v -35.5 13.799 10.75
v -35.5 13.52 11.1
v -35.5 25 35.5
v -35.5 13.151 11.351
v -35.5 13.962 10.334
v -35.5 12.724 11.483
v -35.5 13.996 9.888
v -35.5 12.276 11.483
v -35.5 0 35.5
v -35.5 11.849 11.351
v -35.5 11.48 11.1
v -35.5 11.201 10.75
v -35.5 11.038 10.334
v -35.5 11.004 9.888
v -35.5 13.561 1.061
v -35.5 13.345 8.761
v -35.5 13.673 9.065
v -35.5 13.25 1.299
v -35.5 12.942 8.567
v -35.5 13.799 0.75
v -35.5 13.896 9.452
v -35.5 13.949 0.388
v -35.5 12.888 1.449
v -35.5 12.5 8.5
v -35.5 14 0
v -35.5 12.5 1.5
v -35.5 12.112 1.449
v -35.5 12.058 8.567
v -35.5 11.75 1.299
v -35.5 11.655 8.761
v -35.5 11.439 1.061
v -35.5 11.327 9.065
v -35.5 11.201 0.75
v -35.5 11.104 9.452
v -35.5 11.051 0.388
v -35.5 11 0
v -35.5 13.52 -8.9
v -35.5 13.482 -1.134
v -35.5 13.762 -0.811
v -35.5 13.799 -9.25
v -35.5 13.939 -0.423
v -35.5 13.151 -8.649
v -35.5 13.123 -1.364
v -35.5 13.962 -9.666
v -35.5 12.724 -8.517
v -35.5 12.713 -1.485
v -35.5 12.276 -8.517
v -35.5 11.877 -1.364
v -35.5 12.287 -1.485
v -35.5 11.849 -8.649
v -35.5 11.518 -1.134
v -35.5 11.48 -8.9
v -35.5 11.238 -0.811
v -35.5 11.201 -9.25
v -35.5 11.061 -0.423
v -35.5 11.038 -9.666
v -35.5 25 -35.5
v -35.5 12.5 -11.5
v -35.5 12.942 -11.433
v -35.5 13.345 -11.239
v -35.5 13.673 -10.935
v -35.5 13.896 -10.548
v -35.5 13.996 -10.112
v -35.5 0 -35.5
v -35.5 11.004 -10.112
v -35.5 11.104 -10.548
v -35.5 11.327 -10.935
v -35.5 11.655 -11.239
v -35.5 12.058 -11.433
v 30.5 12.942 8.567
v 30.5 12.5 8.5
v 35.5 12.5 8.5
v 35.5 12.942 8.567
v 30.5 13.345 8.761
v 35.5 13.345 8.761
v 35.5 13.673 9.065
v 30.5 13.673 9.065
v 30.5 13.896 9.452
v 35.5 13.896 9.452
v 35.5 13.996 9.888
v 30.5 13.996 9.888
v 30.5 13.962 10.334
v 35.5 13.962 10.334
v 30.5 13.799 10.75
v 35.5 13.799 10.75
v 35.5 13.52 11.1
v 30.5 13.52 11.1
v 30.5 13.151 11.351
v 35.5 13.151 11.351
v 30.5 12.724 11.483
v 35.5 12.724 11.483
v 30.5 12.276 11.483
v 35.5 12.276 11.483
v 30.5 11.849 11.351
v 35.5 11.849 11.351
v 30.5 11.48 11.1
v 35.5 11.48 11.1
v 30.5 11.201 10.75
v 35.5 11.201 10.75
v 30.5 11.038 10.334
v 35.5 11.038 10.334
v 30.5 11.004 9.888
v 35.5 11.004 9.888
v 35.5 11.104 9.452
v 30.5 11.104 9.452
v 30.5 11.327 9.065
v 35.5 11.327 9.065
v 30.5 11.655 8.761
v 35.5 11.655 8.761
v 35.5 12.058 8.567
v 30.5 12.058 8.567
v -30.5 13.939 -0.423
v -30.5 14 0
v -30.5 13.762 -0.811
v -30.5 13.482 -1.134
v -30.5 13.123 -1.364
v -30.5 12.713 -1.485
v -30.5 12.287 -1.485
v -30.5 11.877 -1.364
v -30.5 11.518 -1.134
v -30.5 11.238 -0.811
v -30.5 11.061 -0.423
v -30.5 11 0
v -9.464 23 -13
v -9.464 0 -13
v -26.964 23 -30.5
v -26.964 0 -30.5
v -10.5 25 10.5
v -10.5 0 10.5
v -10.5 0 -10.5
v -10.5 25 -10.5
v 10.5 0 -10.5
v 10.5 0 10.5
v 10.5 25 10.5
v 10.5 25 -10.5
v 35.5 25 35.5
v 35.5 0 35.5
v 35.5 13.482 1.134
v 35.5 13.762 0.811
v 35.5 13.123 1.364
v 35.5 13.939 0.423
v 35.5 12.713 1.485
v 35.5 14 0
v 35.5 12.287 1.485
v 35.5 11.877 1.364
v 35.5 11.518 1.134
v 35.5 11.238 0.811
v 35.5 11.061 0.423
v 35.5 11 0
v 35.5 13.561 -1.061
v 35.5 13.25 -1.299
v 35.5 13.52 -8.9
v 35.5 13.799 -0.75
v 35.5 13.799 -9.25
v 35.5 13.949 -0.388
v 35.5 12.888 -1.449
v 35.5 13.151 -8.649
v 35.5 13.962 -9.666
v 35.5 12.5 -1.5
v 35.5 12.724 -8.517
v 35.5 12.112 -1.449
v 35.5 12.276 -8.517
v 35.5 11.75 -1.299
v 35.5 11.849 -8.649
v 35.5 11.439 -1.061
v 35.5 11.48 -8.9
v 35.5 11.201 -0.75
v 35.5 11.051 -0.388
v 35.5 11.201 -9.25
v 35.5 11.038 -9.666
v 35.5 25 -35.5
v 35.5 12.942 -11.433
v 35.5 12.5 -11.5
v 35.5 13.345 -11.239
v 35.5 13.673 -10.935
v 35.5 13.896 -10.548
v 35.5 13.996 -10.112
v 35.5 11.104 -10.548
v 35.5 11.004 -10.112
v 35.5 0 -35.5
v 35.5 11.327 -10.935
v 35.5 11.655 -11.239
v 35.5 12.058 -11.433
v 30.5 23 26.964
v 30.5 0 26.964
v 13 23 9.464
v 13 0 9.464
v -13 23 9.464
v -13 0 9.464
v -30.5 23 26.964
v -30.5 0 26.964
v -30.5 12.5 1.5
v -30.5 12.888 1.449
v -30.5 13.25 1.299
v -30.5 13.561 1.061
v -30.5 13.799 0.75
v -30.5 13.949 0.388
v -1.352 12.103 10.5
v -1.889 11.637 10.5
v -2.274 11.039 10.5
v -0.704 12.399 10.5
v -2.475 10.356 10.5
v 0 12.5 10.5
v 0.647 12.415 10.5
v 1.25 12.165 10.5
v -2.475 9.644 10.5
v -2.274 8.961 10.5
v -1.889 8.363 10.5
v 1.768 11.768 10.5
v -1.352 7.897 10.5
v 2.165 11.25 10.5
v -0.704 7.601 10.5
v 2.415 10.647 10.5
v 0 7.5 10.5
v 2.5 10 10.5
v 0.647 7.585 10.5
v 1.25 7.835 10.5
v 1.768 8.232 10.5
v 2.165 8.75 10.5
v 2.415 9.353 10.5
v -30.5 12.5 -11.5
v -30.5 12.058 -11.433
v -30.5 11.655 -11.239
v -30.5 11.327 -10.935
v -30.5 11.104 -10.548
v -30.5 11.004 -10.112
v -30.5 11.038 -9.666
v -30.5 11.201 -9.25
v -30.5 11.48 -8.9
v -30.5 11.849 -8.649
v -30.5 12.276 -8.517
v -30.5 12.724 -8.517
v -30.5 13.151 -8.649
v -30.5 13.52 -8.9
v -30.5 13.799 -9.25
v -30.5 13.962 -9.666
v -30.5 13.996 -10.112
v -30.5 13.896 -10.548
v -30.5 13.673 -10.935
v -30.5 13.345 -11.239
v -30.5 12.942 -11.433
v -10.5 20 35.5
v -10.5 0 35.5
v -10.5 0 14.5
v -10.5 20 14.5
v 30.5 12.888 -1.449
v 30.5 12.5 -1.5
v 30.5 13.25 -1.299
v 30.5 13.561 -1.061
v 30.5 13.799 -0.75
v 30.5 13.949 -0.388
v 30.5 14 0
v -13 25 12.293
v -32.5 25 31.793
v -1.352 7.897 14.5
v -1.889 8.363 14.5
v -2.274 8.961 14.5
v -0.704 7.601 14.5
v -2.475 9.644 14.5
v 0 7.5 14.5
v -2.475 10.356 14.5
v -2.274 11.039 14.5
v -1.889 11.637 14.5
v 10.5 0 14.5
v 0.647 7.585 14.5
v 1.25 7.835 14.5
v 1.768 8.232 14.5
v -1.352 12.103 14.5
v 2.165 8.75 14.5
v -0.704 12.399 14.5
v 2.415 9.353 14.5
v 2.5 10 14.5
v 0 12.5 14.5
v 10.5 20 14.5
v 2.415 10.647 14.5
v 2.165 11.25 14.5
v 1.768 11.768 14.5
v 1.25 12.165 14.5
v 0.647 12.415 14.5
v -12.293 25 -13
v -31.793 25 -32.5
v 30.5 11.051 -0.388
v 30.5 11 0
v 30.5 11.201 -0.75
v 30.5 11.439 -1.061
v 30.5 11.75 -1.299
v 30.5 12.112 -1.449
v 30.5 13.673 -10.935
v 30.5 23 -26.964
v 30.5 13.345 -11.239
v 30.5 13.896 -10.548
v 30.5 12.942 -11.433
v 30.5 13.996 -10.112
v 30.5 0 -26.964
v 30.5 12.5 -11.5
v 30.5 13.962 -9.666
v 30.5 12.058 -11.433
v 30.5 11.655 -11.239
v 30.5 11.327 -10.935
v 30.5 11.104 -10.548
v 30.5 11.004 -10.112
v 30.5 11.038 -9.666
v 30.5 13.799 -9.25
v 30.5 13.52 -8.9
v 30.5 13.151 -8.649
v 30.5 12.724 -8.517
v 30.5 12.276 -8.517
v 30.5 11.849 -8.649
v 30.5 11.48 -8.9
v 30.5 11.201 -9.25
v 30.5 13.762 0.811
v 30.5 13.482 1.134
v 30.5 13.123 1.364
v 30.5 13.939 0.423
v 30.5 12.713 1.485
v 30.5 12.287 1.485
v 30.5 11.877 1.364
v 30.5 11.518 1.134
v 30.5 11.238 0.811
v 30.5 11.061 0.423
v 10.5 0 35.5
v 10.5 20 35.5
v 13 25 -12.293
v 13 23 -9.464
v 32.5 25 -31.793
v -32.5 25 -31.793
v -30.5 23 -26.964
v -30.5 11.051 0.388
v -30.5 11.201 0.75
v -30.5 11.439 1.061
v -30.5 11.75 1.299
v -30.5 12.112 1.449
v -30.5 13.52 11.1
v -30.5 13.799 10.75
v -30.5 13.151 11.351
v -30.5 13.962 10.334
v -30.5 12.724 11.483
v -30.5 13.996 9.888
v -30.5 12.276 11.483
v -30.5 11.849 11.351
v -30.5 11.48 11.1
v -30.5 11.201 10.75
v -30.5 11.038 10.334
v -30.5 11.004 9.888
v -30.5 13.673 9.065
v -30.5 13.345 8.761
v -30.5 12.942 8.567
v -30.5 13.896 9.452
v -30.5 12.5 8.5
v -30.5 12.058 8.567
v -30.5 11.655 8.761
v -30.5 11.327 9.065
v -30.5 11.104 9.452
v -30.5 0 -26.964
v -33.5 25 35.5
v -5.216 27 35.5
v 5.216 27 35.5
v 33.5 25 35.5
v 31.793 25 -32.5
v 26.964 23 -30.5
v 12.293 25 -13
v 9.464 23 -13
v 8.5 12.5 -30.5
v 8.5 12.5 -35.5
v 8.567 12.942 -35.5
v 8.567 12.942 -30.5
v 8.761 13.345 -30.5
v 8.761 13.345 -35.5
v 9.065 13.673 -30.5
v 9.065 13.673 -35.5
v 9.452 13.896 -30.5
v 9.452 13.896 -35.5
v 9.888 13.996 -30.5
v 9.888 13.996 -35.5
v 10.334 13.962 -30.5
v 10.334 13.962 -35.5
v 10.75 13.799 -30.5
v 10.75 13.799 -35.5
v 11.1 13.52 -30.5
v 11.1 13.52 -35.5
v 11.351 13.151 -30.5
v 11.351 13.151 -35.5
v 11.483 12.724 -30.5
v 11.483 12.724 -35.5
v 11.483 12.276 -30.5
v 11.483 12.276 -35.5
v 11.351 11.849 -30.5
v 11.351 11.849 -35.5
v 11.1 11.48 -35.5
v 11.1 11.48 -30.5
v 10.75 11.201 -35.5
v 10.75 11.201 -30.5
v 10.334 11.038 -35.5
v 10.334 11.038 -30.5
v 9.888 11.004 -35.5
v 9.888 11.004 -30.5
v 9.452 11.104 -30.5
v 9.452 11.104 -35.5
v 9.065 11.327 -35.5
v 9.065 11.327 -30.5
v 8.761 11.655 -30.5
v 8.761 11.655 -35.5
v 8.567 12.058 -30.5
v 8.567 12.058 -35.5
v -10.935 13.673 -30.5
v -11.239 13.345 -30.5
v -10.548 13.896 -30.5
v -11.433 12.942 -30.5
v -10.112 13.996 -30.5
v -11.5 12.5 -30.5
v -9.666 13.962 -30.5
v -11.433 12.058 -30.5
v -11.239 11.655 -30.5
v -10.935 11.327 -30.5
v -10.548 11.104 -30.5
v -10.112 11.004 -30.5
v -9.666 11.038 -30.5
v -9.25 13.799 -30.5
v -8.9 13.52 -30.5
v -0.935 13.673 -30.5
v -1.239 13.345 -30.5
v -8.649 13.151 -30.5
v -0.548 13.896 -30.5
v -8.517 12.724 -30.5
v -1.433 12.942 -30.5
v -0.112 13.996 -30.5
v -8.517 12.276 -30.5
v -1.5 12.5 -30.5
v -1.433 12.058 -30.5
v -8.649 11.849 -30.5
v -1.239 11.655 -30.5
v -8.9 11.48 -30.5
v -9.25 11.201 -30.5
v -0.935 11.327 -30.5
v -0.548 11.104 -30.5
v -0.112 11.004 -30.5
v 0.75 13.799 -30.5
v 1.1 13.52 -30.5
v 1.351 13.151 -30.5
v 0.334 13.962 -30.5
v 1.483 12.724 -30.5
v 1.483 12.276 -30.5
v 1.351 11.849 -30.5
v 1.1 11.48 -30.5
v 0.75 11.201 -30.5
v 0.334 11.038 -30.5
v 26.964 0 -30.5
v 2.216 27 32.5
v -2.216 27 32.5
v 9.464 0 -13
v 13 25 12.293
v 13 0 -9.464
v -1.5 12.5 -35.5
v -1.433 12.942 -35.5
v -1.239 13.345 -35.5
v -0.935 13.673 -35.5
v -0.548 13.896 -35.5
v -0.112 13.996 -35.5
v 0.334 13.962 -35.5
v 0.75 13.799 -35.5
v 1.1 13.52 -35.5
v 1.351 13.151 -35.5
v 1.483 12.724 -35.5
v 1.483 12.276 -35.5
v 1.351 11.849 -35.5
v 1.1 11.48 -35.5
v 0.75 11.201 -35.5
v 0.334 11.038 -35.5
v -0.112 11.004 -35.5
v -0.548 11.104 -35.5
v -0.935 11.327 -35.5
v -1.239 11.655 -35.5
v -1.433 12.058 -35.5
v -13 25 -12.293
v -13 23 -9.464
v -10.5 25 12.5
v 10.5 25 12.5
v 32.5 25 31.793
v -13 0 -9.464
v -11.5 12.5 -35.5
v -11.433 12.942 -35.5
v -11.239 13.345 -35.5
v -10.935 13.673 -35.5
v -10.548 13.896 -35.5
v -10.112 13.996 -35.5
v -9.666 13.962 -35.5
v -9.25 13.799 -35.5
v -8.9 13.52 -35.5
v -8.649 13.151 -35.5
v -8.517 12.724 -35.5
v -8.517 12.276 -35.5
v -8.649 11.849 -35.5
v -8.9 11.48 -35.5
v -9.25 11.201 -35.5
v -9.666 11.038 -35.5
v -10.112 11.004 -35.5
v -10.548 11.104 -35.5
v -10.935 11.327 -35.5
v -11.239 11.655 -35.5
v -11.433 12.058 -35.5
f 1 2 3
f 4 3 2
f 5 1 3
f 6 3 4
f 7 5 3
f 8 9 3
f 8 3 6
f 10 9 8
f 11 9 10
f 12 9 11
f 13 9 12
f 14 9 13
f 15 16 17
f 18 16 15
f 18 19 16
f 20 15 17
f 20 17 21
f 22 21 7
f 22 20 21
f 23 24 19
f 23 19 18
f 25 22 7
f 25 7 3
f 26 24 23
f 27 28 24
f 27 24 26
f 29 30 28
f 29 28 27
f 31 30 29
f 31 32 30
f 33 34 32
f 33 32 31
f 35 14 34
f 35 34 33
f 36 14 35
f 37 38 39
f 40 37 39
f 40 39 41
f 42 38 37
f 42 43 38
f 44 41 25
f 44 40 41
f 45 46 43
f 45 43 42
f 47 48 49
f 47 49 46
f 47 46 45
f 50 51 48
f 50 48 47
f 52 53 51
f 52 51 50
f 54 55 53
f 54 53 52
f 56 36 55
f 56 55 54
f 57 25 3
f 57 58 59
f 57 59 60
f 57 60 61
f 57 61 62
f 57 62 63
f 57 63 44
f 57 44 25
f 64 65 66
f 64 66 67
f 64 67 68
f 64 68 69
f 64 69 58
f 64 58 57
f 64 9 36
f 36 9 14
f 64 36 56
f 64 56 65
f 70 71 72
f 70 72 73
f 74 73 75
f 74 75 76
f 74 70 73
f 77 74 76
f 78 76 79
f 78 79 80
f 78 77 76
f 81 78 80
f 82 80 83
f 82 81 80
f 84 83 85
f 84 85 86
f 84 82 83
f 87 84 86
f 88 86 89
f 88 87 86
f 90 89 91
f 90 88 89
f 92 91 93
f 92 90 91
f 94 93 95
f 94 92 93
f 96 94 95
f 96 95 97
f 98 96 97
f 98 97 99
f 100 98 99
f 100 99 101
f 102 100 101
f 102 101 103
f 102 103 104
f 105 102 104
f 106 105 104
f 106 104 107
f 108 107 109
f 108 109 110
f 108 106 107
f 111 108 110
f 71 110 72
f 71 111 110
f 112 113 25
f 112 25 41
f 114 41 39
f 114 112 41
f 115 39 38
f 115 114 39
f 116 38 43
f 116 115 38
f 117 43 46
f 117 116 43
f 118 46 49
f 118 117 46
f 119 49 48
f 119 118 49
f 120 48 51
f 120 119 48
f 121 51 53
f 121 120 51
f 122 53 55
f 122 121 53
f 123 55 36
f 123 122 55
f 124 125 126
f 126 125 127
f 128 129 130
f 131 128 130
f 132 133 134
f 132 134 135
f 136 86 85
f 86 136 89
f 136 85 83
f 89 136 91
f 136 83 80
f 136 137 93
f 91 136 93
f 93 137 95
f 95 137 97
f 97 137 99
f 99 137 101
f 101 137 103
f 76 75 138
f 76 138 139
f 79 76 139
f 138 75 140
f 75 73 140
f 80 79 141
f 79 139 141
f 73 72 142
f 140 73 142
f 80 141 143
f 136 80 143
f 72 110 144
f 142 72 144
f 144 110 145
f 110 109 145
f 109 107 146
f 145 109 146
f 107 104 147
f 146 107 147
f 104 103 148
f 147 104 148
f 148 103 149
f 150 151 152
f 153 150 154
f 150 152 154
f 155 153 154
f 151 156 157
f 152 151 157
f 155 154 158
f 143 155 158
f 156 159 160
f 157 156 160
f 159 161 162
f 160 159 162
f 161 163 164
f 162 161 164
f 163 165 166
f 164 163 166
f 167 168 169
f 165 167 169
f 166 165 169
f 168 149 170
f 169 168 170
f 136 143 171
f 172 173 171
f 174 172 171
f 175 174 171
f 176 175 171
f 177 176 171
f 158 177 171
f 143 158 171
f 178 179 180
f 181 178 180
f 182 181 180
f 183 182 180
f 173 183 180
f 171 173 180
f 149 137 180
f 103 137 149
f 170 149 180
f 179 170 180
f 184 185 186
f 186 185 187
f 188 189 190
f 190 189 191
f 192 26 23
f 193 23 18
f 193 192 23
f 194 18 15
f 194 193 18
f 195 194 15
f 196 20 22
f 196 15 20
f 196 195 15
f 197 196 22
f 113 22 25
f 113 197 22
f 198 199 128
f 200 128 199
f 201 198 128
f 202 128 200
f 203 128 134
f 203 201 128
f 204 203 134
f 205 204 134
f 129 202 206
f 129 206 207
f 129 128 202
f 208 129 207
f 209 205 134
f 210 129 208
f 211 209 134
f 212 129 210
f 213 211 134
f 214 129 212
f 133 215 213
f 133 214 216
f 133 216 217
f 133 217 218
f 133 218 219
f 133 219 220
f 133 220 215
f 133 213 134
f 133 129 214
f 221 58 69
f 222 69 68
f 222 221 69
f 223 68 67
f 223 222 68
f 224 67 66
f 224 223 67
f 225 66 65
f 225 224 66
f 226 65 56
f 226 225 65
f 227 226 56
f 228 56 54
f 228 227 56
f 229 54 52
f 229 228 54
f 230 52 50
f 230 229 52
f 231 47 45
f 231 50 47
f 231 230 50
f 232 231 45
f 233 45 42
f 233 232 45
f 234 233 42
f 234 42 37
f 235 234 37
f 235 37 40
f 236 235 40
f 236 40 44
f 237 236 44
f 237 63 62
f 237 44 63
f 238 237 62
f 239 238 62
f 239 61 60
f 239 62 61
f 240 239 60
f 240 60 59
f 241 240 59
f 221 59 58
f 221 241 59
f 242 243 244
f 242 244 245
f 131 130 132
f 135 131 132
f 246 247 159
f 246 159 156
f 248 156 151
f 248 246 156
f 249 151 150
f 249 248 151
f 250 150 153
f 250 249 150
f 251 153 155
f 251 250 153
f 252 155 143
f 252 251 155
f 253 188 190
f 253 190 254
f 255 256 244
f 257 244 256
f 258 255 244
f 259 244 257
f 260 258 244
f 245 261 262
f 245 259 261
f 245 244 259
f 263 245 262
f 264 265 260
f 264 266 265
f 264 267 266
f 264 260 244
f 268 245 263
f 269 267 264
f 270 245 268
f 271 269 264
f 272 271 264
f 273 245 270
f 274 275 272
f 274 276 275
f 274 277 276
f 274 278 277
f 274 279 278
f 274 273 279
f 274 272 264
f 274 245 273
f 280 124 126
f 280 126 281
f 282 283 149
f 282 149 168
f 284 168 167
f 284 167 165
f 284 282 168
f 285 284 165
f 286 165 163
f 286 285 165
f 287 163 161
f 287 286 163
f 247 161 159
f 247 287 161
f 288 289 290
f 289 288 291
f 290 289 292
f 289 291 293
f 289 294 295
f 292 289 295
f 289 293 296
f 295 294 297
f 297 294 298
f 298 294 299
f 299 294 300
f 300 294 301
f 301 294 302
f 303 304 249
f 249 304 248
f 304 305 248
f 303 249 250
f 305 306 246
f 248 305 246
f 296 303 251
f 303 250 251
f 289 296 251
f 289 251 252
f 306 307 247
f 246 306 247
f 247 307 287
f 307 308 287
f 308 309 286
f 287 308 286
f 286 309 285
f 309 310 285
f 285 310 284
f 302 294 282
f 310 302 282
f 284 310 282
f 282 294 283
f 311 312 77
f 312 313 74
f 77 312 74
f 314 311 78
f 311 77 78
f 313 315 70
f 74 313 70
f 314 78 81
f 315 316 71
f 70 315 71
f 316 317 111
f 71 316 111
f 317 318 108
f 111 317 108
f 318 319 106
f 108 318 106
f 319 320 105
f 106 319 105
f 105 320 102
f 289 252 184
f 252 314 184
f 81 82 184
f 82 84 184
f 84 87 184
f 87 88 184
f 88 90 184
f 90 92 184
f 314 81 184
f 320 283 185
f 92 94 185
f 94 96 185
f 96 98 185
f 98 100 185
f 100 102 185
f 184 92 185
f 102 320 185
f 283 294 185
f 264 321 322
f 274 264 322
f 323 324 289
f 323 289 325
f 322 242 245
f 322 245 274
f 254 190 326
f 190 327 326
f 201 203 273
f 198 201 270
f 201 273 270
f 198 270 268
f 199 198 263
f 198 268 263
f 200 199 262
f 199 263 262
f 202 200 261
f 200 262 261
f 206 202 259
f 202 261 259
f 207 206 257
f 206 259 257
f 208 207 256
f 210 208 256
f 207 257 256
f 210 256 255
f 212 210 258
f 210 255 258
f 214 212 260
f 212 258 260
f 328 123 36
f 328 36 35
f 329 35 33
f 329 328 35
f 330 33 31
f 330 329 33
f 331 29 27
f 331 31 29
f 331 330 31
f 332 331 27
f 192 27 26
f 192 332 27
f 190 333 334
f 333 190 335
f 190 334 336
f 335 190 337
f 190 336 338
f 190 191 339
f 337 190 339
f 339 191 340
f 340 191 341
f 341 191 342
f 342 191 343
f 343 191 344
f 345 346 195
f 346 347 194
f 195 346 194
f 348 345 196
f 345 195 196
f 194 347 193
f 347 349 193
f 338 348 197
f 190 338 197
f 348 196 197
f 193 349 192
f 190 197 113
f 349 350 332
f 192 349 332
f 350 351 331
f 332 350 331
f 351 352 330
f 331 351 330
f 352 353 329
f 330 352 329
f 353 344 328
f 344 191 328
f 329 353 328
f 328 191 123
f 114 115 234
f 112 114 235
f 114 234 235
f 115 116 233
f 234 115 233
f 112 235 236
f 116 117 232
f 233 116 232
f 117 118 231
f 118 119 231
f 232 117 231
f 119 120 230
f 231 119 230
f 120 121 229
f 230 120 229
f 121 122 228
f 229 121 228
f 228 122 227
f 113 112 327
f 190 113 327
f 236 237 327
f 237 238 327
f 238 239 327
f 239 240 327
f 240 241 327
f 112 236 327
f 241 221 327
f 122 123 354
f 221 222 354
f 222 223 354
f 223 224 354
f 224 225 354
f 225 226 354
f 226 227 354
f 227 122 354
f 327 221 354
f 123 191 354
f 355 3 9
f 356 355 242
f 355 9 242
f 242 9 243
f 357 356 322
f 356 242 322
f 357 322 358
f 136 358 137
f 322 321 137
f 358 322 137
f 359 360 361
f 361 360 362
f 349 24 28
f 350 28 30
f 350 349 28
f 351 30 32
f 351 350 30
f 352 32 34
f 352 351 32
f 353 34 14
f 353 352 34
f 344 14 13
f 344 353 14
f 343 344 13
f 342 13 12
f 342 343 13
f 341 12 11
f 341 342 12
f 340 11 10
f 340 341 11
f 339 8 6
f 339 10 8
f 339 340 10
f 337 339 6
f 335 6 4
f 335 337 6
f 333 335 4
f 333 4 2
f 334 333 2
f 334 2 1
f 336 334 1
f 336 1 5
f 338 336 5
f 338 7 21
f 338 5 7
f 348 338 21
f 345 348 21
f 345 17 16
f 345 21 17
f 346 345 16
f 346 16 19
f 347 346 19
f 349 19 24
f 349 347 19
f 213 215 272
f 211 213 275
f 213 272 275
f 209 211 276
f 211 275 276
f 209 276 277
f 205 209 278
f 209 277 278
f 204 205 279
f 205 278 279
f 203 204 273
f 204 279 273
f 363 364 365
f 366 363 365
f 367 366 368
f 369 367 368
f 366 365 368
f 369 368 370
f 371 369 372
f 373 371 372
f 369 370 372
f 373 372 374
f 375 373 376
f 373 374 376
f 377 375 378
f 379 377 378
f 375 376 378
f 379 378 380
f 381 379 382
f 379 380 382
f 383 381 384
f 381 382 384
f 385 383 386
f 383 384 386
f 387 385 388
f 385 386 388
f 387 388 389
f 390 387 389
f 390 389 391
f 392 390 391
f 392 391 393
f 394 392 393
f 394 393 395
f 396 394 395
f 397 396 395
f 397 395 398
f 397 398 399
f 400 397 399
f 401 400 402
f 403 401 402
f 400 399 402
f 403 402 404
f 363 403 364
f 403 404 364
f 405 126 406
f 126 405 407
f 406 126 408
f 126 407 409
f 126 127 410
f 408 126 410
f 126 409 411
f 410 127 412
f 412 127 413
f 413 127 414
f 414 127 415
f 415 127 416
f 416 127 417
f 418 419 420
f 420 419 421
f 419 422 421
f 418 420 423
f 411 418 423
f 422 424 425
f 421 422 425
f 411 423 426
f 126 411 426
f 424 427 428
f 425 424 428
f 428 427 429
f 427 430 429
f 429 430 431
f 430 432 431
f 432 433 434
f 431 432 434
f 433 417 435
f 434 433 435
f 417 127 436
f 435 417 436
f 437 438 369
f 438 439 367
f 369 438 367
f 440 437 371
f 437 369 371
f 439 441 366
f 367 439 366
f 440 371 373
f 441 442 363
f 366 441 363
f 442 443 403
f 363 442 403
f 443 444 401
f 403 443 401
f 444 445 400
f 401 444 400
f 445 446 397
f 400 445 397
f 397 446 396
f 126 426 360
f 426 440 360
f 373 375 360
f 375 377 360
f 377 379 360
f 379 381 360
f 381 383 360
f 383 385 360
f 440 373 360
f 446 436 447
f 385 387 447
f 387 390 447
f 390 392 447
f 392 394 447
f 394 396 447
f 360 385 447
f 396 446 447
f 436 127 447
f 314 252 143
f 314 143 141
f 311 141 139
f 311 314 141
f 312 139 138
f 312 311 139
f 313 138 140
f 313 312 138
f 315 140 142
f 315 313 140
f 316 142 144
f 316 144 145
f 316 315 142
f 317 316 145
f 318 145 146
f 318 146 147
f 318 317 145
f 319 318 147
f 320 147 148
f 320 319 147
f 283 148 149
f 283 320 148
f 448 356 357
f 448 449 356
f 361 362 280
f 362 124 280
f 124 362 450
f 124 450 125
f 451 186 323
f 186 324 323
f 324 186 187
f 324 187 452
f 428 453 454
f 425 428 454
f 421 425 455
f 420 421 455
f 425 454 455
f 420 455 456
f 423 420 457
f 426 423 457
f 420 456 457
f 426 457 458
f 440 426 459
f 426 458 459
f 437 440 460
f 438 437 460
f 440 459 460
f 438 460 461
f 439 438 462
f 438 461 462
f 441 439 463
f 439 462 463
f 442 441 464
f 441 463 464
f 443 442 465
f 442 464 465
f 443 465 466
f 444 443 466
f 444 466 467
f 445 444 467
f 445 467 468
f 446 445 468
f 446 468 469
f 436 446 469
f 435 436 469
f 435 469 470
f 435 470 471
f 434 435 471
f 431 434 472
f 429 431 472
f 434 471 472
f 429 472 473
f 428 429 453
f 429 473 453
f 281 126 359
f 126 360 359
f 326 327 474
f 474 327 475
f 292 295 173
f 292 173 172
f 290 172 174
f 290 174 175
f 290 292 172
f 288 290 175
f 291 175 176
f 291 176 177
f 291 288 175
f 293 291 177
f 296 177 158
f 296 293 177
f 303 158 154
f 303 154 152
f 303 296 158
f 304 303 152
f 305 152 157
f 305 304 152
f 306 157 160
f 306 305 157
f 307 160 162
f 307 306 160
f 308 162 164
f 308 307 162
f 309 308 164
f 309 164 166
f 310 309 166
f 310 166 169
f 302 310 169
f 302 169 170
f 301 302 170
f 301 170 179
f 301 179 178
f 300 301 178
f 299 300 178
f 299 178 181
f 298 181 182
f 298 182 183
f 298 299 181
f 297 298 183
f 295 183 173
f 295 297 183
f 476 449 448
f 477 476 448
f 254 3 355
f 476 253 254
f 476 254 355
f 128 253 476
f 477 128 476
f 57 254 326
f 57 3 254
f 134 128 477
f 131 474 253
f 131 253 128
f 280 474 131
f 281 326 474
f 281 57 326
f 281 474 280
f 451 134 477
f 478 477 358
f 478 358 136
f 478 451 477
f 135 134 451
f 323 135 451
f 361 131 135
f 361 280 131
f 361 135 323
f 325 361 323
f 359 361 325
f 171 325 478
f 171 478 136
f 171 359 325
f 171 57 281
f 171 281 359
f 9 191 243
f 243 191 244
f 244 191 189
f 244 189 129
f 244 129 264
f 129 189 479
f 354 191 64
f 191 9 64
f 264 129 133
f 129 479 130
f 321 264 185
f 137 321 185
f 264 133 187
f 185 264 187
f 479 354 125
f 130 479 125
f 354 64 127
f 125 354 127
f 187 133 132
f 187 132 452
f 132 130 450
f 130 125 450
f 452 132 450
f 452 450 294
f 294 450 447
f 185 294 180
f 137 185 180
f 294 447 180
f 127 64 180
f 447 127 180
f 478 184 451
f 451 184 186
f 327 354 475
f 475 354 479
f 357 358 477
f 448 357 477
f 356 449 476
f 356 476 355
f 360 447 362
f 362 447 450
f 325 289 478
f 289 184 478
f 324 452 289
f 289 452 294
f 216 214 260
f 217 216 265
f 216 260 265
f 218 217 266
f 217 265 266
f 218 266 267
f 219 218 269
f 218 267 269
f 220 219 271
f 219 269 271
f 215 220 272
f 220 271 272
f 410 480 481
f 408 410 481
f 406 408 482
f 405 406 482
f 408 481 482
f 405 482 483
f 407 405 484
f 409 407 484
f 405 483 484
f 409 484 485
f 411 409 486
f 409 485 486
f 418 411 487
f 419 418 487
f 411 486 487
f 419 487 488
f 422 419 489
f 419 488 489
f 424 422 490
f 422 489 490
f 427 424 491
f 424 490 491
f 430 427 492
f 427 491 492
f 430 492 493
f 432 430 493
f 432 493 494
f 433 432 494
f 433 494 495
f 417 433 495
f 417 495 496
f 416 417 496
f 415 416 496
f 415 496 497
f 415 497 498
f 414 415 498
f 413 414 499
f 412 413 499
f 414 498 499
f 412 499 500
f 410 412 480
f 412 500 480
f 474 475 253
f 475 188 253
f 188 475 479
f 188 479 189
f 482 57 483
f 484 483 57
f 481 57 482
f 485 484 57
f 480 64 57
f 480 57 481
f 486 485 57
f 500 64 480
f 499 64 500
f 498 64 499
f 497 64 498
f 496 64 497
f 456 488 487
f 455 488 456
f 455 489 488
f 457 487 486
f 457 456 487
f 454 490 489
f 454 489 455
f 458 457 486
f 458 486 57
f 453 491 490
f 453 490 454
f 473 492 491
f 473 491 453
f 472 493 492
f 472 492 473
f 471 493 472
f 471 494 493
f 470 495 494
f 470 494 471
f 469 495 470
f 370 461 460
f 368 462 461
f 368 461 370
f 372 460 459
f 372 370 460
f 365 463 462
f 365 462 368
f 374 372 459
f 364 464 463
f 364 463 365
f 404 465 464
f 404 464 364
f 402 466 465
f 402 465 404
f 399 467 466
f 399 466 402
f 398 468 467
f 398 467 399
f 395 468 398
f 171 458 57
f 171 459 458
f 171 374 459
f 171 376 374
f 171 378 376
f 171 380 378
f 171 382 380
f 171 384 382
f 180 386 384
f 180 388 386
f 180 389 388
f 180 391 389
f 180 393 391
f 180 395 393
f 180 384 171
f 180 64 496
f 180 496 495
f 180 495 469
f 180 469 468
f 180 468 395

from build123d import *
from OCP.BRepFilletAPI import BRepFilletAPI_MakeChamfer

# Parameters (mm, degrees)
SKETCH1_W               = 71
SKETCH1_H               = 71
SKETCH1_W_2             = 21
SKETCH1_H_2             = 21
BOSS_EXTRUDE1_DEPTH     = 25
SKETCH2_W               = 21
SKETCH2_H               = 23
BOSS_EXTRUDE2_DEPTH     = 2
CHAMFER1_SIZE           = 2
CHAMFER1_SIZE_2         = 20
CUT_EXTRUDE1_DEPTH      = 84.846586096
CUT_EXTRUDE1_DEPTH_BACK = 5
SKETCH3_R               = 1.5
SKETCH4_R               = 1.5
CUT_EXTRUDE2_DEPTH      = 5
CUT_EXTRUDE3_START      = -5
SKETCH5_R               = 1.5
CUT_EXTRUDE3_DEPTH      = 5
SKETCH6_W               = 21
SKETCH6_H               = 20
SKETCH6_R               = 2.5
CUT_EXTRUDE4_DEPTH      = 21
CUT_EXTRUDE5_DEPTH      = 30
CHAMFER2_SIZE           = 2


with BuildPart() as part:
    # Sketch1 → Boss-Extrude1 (new body)
    with BuildSketch(Plane(origin=(0, 0, 0), x_dir=(1, 0, 0), z_dir=(0, 1, 0))):
        Rectangle(SKETCH1_W, SKETCH1_H)
        Polygon((-13, 9.464466094), (-13, -9.464466094), (-30.5, -26.964466094), (-30.5, 26.964466094), align=None, mode=Mode.SUBTRACT)
        Rectangle(SKETCH1_W_2, SKETCH1_H_2, mode=Mode.SUBTRACT)
        Polygon((30.5, -26.964466094), (13, -9.464466094), (13, 9.464466094), (30.5, 26.964466094), align=None, mode=Mode.SUBTRACT)
        Polygon((9.464466094, 13), (-9.464466094, 13), (-26.964466094, 30.5), (26.964466094, 30.5), align=None, mode=Mode.SUBTRACT)
    extrude(amount=BOSS_EXTRUDE1_DEPTH)

    # Sketch2 → Boss-Extrude2 (add)
    with BuildSketch(Plane(origin=(0, 25, 0), x_dir=(1, 0, 0), z_dir=(0, 1, 0))):
        Polygon((-33.5, -35.5), (-10.5, -35.5), (-10.5, -12.5), align=None)
        with Locations((0, -24)):
            Rectangle(SKETCH2_W, SKETCH2_H)
        Polygon((10.5, -12.5), (10.5, -35.5), (33.5, -35.5), align=None)
    extrude(amount=BOSS_EXTRUDE2_DEPTH)

    # Chamfer1
    chamfer1_edges_1 = [part.edges().sort_by_distance(p)[0] for p in [
        (22, 27, 24),
    ]]
    chamfer1_side_1 = [part.faces().sort_by_distance(p)[0] for p in [
        (22, 26.96, 24),
    ]]
    chamfer1_edges_2 = [part.edges().sort_by_distance(p)[0] for p in [
        (0, 27, 12.5),
    ]]
    chamfer1_side_2 = [part.faces().sort_by_distance(p)[0] for p in [
        (0, 26.96, 12.5),
    ]]
    chamfer1_edges_3 = [part.edges().sort_by_distance(p)[0] for p in [
        (-22, 27, 24),
    ]]
    chamfer1_side_3 = [part.faces().sort_by_distance(p)[0] for p in [
        (-22, 26.96, 24),
    ]]
    chamfer1 = BRepFilletAPI_MakeChamfer(part.part.solid().wrapped)
    for e in chamfer1_edges_1:
        chamfer1.Add(CHAMFER1_SIZE - 0.0001, CHAMFER1_SIZE_2 - 0.0001, e.wrapped, chamfer1_side_1[0].wrapped)
    for e in chamfer1_edges_2:
        chamfer1.Add(CHAMFER1_SIZE - 0.0001, CHAMFER1_SIZE_2 - 0.0001, e.wrapped, chamfer1_side_2[0].wrapped)
    for e in chamfer1_edges_3:
        chamfer1.Add(CHAMFER1_SIZE - 0.0001, CHAMFER1_SIZE_2 - 0.0001, e.wrapped, chamfer1_side_3[0].wrapped)
    add(Compound.cast(chamfer1.Shape()), mode=Mode.REPLACE)  # a hair under: the kernel refuses the full size

    # Sketch3 → Cut-Extrude1 (cut, two sides: drawn at the far end of the back side and taken through both)
    with BuildSketch(Plane.ZY.offset(35.5).offset(-CUT_EXTRUDE1_DEPTH_BACK)):
        with Locations(Location((-10, 12.5, 0), (0, 0, 180))):
            Circle(SKETCH3_R)
        with BuildLine():
            ThreePointArc((0, 14), (-1.5, 12.5), (0, 11))
            Line((0, 11), (0, 14))
        make_face()
        with BuildLine():
            Line((0, 14), (0, 11))
            ThreePointArc((0, 11), (1.060660172, 11.439339828), (1.5, 12.5))
            ThreePointArc((1.5, 12.5), (1.060660172, 13.560660172), (0, 14))
        make_face()
        with Locations(Location((10, 12.5, 0), (0, 0, 180))):
            Circle(SKETCH3_R)
    extrude(amount=CUT_EXTRUDE1_DEPTH + CUT_EXTRUDE1_DEPTH_BACK, mode=Mode.SUBTRACT)

    # Sketch4 → Cut-Extrude2 (cut)
    with BuildSketch(Plane(origin=(0, 0, -35.5), x_dir=(-1, 0, 0), z_dir=(0, 0, -1))):
        with Locations((-10, 12.5)):
            Circle(SKETCH4_R)
        with Locations((0, 12.5)):
            Circle(SKETCH4_R)
        with Locations((10, 12.5)):
            Circle(SKETCH4_R)
    extrude(amount=-CUT_EXTRUDE2_DEPTH, mode=Mode.SUBTRACT)

    # Sketch5 → Cut-Extrude3 (cut)
    with BuildSketch(Plane(origin=(35.5, 0, 0), x_dir=(0, 0, -1), z_dir=(1, 0, 0)).offset(CUT_EXTRUDE3_START)):
        with Locations((-10, 12.5)):
            Circle(SKETCH5_R)
        with BuildLine():
            ThreePointArc((1.5, 12.5), (1.060660172, 13.560660172), (0, 14))
            Line((0, 14), (0, 11))
            ThreePointArc((0, 11), (1.060660172, 11.439339828), (1.5, 12.5))
        make_face()
        with BuildLine():
            Line((0, 11), (0, 14))
            ThreePointArc((0, 14), (-1.5, 12.5), (0, 11))
        make_face()
        with Locations((10, 12.5)):
            Circle(SKETCH5_R)
    extrude(amount=CUT_EXTRUDE3_DEPTH, mode=Mode.SUBTRACT)

    # Sketch6 → Cut-Extrude4 (cut)
    with BuildSketch(Plane.XY.offset(35.5)):
        with Locations((0, 10)):
            Rectangle(SKETCH6_W, SKETCH6_H)
        with Locations((0, 10)):
            Circle(SKETCH6_R, mode=Mode.SUBTRACT)
    extrude(amount=-CUT_EXTRUDE4_DEPTH, mode=Mode.SUBTRACT)

    # Sketch6<2> → Cut-Extrude5 (cut)
    with BuildSketch(Plane.XY.offset(35.5)):
        with BuildLine():
            ThreePointArc((0, 12.5), (-2.5, 10), (0, 7.5))
            Line((0, 7.5), (0, 12.5))
        make_face()
        with BuildLine():
            Line((0, 12.5), (0, 7.5))
            ThreePointArc((0, 7.5), (1.767766953, 8.232233047), (2.5, 10))
            ThreePointArc((2.5, 10), (1.767766953, 11.767766953), (0, 12.5))
        make_face()
    extrude(amount=-CUT_EXTRUDE5_DEPTH, mode=Mode.SUBTRACT)

    # Chamfer2
    chamfer2_edges = [part.edges().sort_by_distance(p)[0] for p in [
        (-18.214466094, 25, -21.75),
        (-30.5, 25, 0),
        (-21.75, 25, -18.214466094),
        (-21.75, 25, 18.214466094),
        (0, 25, -30.5),
        (30.5, 25, 0),
        (21.75, 25, 18.214466094),
        (18.214466094, 25, -21.75),
        (21.75, 25, -18.214466094),
    ]]
    chamfer(chamfer2_edges, length=CHAMFER2_SIZE)


solid = part.part
